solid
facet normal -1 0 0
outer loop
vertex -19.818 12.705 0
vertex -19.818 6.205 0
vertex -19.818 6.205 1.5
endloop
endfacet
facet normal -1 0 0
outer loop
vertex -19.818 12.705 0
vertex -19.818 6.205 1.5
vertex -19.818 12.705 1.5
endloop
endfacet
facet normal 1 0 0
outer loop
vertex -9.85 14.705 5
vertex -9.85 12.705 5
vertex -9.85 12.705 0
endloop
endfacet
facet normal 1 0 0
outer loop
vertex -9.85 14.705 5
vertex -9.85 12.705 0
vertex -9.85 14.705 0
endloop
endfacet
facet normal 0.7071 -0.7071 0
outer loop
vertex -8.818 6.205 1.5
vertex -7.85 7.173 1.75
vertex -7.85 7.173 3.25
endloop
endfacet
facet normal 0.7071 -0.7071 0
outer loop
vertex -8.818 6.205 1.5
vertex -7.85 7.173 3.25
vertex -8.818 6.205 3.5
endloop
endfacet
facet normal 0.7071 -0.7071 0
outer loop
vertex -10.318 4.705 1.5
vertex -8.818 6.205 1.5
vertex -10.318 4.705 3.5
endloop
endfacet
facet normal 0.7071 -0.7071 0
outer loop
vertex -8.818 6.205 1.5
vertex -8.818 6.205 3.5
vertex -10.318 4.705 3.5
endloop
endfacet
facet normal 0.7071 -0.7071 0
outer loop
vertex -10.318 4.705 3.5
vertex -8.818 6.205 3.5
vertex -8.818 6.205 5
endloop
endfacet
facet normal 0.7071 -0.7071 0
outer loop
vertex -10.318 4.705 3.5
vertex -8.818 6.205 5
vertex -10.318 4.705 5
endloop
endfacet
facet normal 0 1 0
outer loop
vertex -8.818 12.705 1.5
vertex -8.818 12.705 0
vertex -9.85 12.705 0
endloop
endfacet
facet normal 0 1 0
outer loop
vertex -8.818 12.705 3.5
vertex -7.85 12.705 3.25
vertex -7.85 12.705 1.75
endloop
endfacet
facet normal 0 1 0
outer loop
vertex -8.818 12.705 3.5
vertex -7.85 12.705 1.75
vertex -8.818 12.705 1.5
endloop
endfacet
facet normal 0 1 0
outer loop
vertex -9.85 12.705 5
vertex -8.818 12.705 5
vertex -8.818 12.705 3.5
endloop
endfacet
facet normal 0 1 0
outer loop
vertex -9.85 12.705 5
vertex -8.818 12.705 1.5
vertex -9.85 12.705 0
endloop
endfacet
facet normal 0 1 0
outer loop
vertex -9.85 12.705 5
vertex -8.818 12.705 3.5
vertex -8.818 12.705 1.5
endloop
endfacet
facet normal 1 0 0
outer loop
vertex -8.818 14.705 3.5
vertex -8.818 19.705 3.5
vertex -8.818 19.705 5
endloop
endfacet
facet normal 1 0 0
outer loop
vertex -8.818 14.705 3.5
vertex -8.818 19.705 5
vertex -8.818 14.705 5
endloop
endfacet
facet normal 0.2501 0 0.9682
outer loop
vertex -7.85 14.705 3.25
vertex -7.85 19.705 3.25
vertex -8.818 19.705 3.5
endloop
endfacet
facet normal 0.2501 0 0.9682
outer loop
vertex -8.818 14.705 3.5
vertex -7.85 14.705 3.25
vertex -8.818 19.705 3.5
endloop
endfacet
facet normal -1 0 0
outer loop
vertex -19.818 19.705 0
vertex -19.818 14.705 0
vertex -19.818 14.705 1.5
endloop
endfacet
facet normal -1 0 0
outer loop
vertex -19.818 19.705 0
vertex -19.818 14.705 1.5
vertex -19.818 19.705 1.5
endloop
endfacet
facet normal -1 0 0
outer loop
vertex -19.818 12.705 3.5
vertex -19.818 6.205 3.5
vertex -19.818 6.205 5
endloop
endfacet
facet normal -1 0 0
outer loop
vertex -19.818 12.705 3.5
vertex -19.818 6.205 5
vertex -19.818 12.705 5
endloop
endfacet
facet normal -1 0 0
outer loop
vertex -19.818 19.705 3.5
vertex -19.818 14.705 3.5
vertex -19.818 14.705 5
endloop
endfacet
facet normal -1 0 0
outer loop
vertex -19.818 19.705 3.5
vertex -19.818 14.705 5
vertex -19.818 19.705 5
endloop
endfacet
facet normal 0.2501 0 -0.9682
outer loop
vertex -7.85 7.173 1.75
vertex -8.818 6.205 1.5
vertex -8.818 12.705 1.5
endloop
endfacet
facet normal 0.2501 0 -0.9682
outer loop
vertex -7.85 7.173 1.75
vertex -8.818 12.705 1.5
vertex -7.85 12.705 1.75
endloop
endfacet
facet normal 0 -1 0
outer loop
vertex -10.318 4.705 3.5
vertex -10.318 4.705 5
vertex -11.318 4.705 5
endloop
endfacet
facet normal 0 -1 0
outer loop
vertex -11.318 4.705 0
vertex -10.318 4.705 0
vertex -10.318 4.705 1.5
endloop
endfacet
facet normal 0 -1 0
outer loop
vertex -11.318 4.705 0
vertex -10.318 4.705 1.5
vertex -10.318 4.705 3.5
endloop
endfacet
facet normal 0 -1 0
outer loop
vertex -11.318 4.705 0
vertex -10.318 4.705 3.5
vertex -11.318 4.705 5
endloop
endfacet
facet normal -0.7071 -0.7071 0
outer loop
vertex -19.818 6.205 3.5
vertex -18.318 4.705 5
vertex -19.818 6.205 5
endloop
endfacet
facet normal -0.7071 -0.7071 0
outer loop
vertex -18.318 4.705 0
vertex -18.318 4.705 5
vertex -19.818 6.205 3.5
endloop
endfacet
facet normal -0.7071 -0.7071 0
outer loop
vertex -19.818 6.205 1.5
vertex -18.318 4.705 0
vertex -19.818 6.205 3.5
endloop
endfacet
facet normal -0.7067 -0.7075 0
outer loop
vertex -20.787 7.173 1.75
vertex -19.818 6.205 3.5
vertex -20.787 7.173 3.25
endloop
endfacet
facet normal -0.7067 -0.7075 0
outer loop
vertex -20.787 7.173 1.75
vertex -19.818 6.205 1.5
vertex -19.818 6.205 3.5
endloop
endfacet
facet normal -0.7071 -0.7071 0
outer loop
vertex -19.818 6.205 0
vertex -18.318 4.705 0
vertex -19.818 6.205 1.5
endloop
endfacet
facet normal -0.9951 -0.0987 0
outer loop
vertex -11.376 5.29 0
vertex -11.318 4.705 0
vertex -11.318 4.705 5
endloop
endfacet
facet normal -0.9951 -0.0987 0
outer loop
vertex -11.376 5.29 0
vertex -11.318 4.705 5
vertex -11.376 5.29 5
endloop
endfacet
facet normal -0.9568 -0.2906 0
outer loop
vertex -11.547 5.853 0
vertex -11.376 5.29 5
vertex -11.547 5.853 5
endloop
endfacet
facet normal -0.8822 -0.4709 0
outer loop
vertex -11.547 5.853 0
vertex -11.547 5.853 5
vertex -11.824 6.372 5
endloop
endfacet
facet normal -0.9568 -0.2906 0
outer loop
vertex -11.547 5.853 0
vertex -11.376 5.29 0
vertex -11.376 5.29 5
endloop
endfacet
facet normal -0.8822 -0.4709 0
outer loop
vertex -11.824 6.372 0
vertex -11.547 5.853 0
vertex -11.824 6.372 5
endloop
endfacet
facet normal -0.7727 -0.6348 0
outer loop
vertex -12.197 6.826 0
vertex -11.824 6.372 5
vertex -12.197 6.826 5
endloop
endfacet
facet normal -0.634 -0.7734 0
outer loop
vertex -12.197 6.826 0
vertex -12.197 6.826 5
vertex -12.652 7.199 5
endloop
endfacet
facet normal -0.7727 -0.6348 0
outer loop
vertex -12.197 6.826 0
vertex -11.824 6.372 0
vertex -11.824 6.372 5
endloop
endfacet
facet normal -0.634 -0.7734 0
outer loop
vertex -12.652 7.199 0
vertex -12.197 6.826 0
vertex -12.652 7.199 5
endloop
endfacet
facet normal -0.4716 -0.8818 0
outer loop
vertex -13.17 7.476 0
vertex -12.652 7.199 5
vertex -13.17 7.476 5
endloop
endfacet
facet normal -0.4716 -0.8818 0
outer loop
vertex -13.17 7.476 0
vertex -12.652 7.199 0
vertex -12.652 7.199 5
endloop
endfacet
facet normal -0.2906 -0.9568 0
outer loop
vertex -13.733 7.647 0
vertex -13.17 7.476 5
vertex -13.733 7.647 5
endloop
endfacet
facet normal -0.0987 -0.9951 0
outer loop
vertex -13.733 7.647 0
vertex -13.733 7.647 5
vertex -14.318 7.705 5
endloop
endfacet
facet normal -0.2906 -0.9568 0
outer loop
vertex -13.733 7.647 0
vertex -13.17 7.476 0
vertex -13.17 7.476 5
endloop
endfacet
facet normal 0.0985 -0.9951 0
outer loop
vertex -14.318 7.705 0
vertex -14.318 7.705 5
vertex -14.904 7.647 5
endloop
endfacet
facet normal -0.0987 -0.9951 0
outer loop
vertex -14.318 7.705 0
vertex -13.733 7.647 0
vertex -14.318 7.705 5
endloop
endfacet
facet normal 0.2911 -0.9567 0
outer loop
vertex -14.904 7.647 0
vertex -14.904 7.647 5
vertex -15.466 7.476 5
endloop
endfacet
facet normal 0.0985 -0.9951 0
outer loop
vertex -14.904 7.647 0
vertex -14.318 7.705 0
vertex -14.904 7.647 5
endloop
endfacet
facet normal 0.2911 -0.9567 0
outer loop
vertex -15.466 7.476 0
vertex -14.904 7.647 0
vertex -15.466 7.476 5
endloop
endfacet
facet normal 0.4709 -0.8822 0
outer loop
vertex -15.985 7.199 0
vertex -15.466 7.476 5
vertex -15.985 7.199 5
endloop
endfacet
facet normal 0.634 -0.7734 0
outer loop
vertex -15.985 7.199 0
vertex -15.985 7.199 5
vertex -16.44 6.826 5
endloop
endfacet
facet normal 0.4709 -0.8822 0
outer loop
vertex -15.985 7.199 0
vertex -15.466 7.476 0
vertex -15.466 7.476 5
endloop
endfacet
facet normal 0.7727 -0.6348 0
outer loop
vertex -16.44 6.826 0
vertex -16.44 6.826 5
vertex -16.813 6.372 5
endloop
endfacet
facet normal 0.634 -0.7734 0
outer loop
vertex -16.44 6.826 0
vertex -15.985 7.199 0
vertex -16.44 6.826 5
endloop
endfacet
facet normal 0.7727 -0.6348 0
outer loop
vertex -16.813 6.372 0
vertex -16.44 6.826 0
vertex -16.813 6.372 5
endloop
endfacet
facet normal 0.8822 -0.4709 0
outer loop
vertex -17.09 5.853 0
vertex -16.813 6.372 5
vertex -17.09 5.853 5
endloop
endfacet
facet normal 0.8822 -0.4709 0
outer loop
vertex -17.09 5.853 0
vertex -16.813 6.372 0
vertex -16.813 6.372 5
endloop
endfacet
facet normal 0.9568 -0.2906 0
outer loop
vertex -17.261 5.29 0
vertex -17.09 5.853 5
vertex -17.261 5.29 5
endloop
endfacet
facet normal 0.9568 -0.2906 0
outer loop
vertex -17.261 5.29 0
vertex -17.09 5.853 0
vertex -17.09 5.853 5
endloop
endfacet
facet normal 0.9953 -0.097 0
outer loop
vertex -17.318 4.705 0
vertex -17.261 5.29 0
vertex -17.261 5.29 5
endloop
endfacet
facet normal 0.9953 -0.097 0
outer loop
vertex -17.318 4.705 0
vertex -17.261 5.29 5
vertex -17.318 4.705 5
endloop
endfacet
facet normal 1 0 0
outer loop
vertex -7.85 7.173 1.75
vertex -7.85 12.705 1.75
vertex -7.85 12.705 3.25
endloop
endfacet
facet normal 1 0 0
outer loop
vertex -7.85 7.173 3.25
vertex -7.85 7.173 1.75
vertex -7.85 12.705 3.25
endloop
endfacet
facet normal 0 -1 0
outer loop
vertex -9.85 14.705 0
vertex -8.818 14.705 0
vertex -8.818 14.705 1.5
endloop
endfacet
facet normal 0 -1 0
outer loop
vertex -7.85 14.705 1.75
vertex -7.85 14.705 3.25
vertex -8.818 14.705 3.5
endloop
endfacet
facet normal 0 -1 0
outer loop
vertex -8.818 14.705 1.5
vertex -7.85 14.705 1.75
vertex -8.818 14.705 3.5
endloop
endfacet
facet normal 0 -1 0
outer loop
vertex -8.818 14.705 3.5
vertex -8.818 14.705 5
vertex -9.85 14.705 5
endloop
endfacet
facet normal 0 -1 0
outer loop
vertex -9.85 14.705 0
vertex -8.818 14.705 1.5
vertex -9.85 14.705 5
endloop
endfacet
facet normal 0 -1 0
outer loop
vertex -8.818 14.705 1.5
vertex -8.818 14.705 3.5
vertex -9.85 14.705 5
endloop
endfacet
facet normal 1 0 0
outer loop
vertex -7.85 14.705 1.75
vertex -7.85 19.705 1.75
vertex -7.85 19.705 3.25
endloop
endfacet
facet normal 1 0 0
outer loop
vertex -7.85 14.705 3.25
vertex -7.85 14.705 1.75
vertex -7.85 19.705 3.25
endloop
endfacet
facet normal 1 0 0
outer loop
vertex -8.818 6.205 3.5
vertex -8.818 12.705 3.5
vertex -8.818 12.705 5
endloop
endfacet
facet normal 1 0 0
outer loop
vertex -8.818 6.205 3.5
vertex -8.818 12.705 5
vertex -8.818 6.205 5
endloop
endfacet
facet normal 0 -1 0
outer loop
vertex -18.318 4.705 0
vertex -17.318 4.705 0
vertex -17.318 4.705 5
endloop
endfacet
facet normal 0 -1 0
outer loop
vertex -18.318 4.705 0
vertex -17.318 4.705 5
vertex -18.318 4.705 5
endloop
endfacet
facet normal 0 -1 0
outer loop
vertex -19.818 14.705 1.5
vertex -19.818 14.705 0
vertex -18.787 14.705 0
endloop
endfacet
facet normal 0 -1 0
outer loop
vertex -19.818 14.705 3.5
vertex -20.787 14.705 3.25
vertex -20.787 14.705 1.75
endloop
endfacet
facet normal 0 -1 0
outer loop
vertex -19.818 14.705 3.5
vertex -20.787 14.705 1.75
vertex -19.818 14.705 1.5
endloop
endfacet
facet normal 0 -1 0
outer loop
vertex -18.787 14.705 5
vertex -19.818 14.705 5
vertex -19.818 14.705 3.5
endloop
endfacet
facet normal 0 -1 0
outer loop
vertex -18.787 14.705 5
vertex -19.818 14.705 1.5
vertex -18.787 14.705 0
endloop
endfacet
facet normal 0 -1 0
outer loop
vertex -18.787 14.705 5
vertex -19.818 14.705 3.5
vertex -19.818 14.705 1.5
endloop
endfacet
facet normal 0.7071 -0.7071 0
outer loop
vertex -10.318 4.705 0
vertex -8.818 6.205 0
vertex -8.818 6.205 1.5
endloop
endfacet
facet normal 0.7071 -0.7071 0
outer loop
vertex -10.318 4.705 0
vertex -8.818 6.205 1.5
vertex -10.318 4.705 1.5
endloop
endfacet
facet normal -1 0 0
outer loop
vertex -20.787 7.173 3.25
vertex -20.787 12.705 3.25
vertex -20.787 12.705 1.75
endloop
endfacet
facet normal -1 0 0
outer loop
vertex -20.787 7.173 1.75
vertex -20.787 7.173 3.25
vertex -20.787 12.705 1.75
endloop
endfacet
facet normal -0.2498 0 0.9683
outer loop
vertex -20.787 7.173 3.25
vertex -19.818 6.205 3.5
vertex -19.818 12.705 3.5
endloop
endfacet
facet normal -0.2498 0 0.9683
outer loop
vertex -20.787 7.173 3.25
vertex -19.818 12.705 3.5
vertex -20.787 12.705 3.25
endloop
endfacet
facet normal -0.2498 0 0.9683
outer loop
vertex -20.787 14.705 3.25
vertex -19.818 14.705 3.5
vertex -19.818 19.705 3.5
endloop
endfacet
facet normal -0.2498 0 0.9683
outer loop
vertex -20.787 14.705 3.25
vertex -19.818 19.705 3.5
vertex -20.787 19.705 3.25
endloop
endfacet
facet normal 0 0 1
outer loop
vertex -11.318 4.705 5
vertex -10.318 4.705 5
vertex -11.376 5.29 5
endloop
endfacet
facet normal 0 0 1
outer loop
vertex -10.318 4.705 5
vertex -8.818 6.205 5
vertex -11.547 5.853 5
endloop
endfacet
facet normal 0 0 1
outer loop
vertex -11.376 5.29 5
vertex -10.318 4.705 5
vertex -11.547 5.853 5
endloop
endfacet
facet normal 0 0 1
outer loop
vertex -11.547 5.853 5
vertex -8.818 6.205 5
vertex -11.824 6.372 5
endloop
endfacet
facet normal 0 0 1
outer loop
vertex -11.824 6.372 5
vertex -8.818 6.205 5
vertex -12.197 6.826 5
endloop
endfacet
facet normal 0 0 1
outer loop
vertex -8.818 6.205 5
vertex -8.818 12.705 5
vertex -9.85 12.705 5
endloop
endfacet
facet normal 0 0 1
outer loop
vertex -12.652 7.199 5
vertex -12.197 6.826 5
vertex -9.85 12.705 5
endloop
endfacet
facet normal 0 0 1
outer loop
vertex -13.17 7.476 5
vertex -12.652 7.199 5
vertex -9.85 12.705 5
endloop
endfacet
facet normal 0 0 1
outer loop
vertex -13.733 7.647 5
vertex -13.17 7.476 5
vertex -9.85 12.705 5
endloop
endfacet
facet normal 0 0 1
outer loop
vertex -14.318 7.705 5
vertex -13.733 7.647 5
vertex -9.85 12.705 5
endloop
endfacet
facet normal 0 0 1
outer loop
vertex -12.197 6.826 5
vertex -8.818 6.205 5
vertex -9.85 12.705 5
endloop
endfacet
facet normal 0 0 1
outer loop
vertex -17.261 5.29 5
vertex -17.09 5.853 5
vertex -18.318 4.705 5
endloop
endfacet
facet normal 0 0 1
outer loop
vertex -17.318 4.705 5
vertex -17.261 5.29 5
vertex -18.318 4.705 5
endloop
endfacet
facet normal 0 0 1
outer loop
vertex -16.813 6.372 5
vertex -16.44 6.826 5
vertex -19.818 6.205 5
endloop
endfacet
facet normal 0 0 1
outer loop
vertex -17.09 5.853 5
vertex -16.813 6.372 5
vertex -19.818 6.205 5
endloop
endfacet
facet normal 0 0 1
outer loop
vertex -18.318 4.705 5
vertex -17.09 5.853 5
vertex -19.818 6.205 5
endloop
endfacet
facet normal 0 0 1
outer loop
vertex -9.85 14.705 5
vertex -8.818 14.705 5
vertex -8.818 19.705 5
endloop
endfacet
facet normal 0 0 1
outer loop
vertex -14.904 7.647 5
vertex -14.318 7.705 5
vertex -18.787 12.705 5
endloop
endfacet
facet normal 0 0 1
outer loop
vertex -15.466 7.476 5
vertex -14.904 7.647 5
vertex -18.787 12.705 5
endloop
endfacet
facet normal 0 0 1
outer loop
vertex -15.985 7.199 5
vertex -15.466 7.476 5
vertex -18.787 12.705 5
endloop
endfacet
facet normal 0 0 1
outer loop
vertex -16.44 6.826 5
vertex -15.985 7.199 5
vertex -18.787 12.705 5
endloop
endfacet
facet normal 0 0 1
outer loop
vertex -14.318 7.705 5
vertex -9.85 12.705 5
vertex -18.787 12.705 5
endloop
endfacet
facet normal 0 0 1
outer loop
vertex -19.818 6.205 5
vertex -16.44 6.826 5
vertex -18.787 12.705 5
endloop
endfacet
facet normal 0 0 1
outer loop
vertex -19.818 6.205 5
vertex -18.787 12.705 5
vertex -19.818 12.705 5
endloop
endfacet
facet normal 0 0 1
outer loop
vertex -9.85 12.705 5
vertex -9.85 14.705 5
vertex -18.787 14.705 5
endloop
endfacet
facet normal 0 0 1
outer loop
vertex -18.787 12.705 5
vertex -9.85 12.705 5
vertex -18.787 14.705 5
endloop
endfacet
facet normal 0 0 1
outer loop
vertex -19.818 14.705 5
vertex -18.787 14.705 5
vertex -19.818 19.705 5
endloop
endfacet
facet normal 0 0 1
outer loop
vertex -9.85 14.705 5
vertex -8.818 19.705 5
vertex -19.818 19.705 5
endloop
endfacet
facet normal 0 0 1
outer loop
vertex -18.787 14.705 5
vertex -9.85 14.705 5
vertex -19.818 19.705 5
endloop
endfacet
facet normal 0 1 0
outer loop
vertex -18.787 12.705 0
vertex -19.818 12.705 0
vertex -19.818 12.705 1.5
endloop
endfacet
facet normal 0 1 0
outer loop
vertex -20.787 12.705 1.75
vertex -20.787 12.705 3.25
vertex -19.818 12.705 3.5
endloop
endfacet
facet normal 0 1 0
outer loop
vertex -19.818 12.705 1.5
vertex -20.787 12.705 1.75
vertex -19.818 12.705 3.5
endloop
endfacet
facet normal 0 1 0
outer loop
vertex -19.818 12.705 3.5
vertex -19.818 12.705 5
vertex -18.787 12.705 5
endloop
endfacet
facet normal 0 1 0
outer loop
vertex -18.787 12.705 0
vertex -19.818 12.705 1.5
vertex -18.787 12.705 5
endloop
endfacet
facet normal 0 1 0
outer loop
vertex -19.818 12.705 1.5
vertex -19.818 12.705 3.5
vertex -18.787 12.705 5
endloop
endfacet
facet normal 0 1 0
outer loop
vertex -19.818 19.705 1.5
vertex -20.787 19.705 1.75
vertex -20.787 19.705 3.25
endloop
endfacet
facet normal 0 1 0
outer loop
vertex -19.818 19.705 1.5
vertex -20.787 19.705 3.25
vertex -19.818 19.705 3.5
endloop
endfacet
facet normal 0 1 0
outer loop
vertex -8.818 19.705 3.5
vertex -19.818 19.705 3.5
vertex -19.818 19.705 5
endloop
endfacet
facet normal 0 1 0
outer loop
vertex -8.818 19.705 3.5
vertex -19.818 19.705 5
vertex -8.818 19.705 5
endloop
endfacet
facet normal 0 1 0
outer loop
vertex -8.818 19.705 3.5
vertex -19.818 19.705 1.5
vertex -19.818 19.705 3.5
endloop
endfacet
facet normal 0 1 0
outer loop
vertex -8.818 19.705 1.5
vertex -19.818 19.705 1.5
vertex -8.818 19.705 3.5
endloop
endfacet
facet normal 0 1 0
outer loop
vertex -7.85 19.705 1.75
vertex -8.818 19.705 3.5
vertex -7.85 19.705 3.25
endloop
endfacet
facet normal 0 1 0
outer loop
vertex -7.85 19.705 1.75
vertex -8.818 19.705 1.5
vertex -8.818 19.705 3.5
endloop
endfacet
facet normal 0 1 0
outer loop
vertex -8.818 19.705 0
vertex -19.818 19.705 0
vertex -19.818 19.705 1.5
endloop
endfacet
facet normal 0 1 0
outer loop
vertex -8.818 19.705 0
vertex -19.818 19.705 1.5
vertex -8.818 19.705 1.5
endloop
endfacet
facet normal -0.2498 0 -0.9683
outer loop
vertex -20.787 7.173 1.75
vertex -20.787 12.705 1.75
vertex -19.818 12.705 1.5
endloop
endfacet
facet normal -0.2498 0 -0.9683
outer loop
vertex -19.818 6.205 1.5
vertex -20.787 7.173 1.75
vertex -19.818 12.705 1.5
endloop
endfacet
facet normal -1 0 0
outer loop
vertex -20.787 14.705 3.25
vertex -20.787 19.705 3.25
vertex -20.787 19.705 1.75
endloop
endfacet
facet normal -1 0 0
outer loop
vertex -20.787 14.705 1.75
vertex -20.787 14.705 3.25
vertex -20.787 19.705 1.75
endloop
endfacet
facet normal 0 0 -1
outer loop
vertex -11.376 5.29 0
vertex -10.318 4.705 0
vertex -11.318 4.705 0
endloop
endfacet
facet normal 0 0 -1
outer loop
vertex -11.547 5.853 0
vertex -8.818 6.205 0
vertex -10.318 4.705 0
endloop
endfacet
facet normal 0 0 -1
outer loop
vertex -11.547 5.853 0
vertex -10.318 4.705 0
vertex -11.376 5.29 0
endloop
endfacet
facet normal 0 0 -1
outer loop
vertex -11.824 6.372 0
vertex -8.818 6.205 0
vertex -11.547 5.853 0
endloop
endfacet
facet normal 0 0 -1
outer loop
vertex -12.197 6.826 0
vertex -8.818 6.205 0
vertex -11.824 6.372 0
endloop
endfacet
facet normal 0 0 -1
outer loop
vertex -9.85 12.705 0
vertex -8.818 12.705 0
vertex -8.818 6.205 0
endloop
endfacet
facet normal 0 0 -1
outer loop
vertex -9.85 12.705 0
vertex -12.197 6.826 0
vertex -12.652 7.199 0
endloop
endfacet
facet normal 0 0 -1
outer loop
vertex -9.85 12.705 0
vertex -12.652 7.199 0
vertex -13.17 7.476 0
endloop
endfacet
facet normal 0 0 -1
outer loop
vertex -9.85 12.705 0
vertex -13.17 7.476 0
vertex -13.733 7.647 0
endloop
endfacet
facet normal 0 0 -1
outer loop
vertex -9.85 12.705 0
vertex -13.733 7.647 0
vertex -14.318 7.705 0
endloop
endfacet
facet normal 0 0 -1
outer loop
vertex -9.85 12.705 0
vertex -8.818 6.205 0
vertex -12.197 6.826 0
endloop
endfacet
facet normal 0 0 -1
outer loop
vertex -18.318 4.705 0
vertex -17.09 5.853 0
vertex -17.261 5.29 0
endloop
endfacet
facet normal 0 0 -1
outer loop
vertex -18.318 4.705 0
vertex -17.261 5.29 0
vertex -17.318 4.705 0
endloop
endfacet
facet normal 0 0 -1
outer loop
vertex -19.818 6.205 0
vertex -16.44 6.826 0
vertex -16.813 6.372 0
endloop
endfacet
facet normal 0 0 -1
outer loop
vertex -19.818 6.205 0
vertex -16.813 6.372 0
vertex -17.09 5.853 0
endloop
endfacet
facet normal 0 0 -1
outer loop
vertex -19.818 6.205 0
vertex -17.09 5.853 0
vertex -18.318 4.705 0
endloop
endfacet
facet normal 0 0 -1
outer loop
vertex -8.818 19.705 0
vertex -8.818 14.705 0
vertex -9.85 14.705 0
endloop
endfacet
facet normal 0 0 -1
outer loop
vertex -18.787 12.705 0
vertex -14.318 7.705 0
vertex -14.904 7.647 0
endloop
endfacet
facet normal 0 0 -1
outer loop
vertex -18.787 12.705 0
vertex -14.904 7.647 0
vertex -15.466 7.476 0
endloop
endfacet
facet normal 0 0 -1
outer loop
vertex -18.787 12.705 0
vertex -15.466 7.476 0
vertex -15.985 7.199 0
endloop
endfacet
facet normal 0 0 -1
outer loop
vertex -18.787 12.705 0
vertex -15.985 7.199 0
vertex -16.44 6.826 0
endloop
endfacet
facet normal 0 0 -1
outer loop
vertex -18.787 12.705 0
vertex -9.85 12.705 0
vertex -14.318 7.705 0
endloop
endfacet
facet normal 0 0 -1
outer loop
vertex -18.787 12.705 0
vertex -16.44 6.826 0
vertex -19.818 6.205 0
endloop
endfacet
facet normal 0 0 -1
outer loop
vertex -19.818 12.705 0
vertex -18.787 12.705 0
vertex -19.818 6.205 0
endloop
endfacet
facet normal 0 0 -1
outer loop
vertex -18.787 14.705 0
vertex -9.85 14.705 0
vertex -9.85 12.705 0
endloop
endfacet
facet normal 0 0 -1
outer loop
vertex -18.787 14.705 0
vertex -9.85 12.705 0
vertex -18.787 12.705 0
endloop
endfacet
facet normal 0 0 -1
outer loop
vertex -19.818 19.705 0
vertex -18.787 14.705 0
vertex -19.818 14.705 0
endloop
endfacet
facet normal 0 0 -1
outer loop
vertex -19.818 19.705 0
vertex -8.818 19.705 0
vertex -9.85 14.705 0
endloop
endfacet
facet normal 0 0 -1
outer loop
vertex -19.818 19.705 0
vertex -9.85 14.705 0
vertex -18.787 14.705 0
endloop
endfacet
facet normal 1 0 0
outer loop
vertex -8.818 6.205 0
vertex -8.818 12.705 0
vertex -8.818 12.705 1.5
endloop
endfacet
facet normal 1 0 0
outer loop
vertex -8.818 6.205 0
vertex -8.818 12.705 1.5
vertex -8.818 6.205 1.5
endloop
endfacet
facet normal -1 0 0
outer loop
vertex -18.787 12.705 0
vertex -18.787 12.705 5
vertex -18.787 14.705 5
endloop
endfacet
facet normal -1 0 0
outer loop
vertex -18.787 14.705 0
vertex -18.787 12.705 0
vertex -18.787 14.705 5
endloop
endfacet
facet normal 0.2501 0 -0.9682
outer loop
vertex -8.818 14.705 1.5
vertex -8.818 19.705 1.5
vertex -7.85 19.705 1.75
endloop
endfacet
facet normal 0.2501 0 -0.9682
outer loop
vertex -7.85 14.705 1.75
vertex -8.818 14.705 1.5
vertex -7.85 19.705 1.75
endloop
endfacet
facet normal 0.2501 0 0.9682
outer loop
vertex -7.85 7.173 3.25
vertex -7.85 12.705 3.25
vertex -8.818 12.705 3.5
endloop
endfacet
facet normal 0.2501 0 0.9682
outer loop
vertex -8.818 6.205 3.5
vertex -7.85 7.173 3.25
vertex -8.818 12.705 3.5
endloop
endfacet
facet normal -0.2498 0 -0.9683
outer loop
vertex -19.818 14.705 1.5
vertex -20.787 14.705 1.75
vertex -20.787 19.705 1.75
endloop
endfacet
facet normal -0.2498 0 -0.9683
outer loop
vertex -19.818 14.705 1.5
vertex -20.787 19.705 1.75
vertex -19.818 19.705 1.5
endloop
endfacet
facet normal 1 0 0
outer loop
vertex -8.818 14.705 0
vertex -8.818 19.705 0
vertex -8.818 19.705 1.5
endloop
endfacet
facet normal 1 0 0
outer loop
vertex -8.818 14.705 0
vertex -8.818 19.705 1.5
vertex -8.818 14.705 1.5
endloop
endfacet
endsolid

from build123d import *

# Parameters (mm, degrees)
BOSS_EXTRUDE1_DEPTH = 5
BOSS_EXTRUDE2_DEPTH = 15
CUT_EXTRUDE1_DEPTH  = 15
SKETCH4_W           = 2
SKETCH4_H           = 2
CUT_EXTRUDE2_DEPTH  = 15


with BuildPart() as part:
    # Sketch1 → Boss-Extrude1 (new body)
    with BuildSketch(Plane.XY):
        with BuildLine():
            Line((-19.818415432, 19.704812021), (-8.818415432, 19.704812021))
            Line((-8.818415432, 19.704812021), (-8.818415432, 6.204812021))
            Line((-8.818415432, 6.204812021), (-10.318415432, 4.704812021))
            Line((-10.318415432, 4.704812021), (-11.318415432, 4.704812021))
            ThreePointArc((-11.318415432, 4.704812021), (-14.318415432, 7.704812021), (-17.318415432, 4.704812021))
            Line((-17.318415432, 4.704812021), (-18.318415432, 4.704812021))
            Line((-18.318415432, 4.704812021), (-19.818415432, 6.204812021))
            Line((-19.818415432, 6.204812021), (-19.818415432, 19.704812021))
        make_face()
    extrude(amount=BOSS_EXTRUDE1_DEPTH)

    # Sketch2 → Boss-Extrude2 (add)
    with BuildSketch(Plane(origin=(0, 19.704812021, 0), x_dir=(1, 0, 0), z_dir=(0, 1, 0))):
        Polygon((-19.818415432, -1.5), (-8.818415432, -1.5), (-7.850169596, -1.75), (-7.850169596, -3.25), (-8.818415432, -3.5), (-19.818415432, -3.5), (-20.786661269, -3.25), (-20.786661269, -1.75), align=None)
    extrude(amount=-BOSS_EXTRUDE2_DEPTH)

    # Sketch3 → Cut-Extrude1 (cut)
    with BuildSketch(Plane.XY.offset(5)):
        with BuildLine():
            Line((-18.318415432, 4.704812021), (-20.786661269, 7.173057858))
            Line((-20.786661269, 7.173057858), (-20.786661269, 3.709596772))
            Line((-20.786661269, 3.709596772), (-7.850169596, 3.709596772))
            Line((-7.850169596, 3.709596772), (-7.850169596, 7.173057858))
            Line((-7.850169596, 7.173057858), (-10.318415432, 4.704812021))
            Line((-10.318415432, 4.704812021), (-11.318415432, 4.704812021))
            ThreePointArc((-11.318415432, 4.704812021), (-14.318415432, 7.704812021), (-17.318415432, 4.704812021))
            Line((-17.318415432, 4.704812021), (-18.318415432, 4.704812021))
        make_face()
    extrude(amount=-CUT_EXTRUDE1_DEPTH, mode=Mode.SUBTRACT)

    # Sketch4 → Cut-Extrude2 (cut)
    with BuildSketch(Plane.XY.offset(5)):
        with Locations((-19.786661269, 13.704812021)):
            Rectangle(SKETCH4_W, SKETCH4_H)
    cut_extrude2 = extrude(amount=-CUT_EXTRUDE2_DEPTH, mode=Mode.SUBTRACT)

    # Mirror1: Cut-Extrude2 across plane
    add(cut_extrude2.mirror(Plane(origin=(-14.318415432, 0, 0), x_dir=(0, 0, 1), z_dir=(1, 0, 0))), mode=Mode.SUBTRACT)


solid = part.part
